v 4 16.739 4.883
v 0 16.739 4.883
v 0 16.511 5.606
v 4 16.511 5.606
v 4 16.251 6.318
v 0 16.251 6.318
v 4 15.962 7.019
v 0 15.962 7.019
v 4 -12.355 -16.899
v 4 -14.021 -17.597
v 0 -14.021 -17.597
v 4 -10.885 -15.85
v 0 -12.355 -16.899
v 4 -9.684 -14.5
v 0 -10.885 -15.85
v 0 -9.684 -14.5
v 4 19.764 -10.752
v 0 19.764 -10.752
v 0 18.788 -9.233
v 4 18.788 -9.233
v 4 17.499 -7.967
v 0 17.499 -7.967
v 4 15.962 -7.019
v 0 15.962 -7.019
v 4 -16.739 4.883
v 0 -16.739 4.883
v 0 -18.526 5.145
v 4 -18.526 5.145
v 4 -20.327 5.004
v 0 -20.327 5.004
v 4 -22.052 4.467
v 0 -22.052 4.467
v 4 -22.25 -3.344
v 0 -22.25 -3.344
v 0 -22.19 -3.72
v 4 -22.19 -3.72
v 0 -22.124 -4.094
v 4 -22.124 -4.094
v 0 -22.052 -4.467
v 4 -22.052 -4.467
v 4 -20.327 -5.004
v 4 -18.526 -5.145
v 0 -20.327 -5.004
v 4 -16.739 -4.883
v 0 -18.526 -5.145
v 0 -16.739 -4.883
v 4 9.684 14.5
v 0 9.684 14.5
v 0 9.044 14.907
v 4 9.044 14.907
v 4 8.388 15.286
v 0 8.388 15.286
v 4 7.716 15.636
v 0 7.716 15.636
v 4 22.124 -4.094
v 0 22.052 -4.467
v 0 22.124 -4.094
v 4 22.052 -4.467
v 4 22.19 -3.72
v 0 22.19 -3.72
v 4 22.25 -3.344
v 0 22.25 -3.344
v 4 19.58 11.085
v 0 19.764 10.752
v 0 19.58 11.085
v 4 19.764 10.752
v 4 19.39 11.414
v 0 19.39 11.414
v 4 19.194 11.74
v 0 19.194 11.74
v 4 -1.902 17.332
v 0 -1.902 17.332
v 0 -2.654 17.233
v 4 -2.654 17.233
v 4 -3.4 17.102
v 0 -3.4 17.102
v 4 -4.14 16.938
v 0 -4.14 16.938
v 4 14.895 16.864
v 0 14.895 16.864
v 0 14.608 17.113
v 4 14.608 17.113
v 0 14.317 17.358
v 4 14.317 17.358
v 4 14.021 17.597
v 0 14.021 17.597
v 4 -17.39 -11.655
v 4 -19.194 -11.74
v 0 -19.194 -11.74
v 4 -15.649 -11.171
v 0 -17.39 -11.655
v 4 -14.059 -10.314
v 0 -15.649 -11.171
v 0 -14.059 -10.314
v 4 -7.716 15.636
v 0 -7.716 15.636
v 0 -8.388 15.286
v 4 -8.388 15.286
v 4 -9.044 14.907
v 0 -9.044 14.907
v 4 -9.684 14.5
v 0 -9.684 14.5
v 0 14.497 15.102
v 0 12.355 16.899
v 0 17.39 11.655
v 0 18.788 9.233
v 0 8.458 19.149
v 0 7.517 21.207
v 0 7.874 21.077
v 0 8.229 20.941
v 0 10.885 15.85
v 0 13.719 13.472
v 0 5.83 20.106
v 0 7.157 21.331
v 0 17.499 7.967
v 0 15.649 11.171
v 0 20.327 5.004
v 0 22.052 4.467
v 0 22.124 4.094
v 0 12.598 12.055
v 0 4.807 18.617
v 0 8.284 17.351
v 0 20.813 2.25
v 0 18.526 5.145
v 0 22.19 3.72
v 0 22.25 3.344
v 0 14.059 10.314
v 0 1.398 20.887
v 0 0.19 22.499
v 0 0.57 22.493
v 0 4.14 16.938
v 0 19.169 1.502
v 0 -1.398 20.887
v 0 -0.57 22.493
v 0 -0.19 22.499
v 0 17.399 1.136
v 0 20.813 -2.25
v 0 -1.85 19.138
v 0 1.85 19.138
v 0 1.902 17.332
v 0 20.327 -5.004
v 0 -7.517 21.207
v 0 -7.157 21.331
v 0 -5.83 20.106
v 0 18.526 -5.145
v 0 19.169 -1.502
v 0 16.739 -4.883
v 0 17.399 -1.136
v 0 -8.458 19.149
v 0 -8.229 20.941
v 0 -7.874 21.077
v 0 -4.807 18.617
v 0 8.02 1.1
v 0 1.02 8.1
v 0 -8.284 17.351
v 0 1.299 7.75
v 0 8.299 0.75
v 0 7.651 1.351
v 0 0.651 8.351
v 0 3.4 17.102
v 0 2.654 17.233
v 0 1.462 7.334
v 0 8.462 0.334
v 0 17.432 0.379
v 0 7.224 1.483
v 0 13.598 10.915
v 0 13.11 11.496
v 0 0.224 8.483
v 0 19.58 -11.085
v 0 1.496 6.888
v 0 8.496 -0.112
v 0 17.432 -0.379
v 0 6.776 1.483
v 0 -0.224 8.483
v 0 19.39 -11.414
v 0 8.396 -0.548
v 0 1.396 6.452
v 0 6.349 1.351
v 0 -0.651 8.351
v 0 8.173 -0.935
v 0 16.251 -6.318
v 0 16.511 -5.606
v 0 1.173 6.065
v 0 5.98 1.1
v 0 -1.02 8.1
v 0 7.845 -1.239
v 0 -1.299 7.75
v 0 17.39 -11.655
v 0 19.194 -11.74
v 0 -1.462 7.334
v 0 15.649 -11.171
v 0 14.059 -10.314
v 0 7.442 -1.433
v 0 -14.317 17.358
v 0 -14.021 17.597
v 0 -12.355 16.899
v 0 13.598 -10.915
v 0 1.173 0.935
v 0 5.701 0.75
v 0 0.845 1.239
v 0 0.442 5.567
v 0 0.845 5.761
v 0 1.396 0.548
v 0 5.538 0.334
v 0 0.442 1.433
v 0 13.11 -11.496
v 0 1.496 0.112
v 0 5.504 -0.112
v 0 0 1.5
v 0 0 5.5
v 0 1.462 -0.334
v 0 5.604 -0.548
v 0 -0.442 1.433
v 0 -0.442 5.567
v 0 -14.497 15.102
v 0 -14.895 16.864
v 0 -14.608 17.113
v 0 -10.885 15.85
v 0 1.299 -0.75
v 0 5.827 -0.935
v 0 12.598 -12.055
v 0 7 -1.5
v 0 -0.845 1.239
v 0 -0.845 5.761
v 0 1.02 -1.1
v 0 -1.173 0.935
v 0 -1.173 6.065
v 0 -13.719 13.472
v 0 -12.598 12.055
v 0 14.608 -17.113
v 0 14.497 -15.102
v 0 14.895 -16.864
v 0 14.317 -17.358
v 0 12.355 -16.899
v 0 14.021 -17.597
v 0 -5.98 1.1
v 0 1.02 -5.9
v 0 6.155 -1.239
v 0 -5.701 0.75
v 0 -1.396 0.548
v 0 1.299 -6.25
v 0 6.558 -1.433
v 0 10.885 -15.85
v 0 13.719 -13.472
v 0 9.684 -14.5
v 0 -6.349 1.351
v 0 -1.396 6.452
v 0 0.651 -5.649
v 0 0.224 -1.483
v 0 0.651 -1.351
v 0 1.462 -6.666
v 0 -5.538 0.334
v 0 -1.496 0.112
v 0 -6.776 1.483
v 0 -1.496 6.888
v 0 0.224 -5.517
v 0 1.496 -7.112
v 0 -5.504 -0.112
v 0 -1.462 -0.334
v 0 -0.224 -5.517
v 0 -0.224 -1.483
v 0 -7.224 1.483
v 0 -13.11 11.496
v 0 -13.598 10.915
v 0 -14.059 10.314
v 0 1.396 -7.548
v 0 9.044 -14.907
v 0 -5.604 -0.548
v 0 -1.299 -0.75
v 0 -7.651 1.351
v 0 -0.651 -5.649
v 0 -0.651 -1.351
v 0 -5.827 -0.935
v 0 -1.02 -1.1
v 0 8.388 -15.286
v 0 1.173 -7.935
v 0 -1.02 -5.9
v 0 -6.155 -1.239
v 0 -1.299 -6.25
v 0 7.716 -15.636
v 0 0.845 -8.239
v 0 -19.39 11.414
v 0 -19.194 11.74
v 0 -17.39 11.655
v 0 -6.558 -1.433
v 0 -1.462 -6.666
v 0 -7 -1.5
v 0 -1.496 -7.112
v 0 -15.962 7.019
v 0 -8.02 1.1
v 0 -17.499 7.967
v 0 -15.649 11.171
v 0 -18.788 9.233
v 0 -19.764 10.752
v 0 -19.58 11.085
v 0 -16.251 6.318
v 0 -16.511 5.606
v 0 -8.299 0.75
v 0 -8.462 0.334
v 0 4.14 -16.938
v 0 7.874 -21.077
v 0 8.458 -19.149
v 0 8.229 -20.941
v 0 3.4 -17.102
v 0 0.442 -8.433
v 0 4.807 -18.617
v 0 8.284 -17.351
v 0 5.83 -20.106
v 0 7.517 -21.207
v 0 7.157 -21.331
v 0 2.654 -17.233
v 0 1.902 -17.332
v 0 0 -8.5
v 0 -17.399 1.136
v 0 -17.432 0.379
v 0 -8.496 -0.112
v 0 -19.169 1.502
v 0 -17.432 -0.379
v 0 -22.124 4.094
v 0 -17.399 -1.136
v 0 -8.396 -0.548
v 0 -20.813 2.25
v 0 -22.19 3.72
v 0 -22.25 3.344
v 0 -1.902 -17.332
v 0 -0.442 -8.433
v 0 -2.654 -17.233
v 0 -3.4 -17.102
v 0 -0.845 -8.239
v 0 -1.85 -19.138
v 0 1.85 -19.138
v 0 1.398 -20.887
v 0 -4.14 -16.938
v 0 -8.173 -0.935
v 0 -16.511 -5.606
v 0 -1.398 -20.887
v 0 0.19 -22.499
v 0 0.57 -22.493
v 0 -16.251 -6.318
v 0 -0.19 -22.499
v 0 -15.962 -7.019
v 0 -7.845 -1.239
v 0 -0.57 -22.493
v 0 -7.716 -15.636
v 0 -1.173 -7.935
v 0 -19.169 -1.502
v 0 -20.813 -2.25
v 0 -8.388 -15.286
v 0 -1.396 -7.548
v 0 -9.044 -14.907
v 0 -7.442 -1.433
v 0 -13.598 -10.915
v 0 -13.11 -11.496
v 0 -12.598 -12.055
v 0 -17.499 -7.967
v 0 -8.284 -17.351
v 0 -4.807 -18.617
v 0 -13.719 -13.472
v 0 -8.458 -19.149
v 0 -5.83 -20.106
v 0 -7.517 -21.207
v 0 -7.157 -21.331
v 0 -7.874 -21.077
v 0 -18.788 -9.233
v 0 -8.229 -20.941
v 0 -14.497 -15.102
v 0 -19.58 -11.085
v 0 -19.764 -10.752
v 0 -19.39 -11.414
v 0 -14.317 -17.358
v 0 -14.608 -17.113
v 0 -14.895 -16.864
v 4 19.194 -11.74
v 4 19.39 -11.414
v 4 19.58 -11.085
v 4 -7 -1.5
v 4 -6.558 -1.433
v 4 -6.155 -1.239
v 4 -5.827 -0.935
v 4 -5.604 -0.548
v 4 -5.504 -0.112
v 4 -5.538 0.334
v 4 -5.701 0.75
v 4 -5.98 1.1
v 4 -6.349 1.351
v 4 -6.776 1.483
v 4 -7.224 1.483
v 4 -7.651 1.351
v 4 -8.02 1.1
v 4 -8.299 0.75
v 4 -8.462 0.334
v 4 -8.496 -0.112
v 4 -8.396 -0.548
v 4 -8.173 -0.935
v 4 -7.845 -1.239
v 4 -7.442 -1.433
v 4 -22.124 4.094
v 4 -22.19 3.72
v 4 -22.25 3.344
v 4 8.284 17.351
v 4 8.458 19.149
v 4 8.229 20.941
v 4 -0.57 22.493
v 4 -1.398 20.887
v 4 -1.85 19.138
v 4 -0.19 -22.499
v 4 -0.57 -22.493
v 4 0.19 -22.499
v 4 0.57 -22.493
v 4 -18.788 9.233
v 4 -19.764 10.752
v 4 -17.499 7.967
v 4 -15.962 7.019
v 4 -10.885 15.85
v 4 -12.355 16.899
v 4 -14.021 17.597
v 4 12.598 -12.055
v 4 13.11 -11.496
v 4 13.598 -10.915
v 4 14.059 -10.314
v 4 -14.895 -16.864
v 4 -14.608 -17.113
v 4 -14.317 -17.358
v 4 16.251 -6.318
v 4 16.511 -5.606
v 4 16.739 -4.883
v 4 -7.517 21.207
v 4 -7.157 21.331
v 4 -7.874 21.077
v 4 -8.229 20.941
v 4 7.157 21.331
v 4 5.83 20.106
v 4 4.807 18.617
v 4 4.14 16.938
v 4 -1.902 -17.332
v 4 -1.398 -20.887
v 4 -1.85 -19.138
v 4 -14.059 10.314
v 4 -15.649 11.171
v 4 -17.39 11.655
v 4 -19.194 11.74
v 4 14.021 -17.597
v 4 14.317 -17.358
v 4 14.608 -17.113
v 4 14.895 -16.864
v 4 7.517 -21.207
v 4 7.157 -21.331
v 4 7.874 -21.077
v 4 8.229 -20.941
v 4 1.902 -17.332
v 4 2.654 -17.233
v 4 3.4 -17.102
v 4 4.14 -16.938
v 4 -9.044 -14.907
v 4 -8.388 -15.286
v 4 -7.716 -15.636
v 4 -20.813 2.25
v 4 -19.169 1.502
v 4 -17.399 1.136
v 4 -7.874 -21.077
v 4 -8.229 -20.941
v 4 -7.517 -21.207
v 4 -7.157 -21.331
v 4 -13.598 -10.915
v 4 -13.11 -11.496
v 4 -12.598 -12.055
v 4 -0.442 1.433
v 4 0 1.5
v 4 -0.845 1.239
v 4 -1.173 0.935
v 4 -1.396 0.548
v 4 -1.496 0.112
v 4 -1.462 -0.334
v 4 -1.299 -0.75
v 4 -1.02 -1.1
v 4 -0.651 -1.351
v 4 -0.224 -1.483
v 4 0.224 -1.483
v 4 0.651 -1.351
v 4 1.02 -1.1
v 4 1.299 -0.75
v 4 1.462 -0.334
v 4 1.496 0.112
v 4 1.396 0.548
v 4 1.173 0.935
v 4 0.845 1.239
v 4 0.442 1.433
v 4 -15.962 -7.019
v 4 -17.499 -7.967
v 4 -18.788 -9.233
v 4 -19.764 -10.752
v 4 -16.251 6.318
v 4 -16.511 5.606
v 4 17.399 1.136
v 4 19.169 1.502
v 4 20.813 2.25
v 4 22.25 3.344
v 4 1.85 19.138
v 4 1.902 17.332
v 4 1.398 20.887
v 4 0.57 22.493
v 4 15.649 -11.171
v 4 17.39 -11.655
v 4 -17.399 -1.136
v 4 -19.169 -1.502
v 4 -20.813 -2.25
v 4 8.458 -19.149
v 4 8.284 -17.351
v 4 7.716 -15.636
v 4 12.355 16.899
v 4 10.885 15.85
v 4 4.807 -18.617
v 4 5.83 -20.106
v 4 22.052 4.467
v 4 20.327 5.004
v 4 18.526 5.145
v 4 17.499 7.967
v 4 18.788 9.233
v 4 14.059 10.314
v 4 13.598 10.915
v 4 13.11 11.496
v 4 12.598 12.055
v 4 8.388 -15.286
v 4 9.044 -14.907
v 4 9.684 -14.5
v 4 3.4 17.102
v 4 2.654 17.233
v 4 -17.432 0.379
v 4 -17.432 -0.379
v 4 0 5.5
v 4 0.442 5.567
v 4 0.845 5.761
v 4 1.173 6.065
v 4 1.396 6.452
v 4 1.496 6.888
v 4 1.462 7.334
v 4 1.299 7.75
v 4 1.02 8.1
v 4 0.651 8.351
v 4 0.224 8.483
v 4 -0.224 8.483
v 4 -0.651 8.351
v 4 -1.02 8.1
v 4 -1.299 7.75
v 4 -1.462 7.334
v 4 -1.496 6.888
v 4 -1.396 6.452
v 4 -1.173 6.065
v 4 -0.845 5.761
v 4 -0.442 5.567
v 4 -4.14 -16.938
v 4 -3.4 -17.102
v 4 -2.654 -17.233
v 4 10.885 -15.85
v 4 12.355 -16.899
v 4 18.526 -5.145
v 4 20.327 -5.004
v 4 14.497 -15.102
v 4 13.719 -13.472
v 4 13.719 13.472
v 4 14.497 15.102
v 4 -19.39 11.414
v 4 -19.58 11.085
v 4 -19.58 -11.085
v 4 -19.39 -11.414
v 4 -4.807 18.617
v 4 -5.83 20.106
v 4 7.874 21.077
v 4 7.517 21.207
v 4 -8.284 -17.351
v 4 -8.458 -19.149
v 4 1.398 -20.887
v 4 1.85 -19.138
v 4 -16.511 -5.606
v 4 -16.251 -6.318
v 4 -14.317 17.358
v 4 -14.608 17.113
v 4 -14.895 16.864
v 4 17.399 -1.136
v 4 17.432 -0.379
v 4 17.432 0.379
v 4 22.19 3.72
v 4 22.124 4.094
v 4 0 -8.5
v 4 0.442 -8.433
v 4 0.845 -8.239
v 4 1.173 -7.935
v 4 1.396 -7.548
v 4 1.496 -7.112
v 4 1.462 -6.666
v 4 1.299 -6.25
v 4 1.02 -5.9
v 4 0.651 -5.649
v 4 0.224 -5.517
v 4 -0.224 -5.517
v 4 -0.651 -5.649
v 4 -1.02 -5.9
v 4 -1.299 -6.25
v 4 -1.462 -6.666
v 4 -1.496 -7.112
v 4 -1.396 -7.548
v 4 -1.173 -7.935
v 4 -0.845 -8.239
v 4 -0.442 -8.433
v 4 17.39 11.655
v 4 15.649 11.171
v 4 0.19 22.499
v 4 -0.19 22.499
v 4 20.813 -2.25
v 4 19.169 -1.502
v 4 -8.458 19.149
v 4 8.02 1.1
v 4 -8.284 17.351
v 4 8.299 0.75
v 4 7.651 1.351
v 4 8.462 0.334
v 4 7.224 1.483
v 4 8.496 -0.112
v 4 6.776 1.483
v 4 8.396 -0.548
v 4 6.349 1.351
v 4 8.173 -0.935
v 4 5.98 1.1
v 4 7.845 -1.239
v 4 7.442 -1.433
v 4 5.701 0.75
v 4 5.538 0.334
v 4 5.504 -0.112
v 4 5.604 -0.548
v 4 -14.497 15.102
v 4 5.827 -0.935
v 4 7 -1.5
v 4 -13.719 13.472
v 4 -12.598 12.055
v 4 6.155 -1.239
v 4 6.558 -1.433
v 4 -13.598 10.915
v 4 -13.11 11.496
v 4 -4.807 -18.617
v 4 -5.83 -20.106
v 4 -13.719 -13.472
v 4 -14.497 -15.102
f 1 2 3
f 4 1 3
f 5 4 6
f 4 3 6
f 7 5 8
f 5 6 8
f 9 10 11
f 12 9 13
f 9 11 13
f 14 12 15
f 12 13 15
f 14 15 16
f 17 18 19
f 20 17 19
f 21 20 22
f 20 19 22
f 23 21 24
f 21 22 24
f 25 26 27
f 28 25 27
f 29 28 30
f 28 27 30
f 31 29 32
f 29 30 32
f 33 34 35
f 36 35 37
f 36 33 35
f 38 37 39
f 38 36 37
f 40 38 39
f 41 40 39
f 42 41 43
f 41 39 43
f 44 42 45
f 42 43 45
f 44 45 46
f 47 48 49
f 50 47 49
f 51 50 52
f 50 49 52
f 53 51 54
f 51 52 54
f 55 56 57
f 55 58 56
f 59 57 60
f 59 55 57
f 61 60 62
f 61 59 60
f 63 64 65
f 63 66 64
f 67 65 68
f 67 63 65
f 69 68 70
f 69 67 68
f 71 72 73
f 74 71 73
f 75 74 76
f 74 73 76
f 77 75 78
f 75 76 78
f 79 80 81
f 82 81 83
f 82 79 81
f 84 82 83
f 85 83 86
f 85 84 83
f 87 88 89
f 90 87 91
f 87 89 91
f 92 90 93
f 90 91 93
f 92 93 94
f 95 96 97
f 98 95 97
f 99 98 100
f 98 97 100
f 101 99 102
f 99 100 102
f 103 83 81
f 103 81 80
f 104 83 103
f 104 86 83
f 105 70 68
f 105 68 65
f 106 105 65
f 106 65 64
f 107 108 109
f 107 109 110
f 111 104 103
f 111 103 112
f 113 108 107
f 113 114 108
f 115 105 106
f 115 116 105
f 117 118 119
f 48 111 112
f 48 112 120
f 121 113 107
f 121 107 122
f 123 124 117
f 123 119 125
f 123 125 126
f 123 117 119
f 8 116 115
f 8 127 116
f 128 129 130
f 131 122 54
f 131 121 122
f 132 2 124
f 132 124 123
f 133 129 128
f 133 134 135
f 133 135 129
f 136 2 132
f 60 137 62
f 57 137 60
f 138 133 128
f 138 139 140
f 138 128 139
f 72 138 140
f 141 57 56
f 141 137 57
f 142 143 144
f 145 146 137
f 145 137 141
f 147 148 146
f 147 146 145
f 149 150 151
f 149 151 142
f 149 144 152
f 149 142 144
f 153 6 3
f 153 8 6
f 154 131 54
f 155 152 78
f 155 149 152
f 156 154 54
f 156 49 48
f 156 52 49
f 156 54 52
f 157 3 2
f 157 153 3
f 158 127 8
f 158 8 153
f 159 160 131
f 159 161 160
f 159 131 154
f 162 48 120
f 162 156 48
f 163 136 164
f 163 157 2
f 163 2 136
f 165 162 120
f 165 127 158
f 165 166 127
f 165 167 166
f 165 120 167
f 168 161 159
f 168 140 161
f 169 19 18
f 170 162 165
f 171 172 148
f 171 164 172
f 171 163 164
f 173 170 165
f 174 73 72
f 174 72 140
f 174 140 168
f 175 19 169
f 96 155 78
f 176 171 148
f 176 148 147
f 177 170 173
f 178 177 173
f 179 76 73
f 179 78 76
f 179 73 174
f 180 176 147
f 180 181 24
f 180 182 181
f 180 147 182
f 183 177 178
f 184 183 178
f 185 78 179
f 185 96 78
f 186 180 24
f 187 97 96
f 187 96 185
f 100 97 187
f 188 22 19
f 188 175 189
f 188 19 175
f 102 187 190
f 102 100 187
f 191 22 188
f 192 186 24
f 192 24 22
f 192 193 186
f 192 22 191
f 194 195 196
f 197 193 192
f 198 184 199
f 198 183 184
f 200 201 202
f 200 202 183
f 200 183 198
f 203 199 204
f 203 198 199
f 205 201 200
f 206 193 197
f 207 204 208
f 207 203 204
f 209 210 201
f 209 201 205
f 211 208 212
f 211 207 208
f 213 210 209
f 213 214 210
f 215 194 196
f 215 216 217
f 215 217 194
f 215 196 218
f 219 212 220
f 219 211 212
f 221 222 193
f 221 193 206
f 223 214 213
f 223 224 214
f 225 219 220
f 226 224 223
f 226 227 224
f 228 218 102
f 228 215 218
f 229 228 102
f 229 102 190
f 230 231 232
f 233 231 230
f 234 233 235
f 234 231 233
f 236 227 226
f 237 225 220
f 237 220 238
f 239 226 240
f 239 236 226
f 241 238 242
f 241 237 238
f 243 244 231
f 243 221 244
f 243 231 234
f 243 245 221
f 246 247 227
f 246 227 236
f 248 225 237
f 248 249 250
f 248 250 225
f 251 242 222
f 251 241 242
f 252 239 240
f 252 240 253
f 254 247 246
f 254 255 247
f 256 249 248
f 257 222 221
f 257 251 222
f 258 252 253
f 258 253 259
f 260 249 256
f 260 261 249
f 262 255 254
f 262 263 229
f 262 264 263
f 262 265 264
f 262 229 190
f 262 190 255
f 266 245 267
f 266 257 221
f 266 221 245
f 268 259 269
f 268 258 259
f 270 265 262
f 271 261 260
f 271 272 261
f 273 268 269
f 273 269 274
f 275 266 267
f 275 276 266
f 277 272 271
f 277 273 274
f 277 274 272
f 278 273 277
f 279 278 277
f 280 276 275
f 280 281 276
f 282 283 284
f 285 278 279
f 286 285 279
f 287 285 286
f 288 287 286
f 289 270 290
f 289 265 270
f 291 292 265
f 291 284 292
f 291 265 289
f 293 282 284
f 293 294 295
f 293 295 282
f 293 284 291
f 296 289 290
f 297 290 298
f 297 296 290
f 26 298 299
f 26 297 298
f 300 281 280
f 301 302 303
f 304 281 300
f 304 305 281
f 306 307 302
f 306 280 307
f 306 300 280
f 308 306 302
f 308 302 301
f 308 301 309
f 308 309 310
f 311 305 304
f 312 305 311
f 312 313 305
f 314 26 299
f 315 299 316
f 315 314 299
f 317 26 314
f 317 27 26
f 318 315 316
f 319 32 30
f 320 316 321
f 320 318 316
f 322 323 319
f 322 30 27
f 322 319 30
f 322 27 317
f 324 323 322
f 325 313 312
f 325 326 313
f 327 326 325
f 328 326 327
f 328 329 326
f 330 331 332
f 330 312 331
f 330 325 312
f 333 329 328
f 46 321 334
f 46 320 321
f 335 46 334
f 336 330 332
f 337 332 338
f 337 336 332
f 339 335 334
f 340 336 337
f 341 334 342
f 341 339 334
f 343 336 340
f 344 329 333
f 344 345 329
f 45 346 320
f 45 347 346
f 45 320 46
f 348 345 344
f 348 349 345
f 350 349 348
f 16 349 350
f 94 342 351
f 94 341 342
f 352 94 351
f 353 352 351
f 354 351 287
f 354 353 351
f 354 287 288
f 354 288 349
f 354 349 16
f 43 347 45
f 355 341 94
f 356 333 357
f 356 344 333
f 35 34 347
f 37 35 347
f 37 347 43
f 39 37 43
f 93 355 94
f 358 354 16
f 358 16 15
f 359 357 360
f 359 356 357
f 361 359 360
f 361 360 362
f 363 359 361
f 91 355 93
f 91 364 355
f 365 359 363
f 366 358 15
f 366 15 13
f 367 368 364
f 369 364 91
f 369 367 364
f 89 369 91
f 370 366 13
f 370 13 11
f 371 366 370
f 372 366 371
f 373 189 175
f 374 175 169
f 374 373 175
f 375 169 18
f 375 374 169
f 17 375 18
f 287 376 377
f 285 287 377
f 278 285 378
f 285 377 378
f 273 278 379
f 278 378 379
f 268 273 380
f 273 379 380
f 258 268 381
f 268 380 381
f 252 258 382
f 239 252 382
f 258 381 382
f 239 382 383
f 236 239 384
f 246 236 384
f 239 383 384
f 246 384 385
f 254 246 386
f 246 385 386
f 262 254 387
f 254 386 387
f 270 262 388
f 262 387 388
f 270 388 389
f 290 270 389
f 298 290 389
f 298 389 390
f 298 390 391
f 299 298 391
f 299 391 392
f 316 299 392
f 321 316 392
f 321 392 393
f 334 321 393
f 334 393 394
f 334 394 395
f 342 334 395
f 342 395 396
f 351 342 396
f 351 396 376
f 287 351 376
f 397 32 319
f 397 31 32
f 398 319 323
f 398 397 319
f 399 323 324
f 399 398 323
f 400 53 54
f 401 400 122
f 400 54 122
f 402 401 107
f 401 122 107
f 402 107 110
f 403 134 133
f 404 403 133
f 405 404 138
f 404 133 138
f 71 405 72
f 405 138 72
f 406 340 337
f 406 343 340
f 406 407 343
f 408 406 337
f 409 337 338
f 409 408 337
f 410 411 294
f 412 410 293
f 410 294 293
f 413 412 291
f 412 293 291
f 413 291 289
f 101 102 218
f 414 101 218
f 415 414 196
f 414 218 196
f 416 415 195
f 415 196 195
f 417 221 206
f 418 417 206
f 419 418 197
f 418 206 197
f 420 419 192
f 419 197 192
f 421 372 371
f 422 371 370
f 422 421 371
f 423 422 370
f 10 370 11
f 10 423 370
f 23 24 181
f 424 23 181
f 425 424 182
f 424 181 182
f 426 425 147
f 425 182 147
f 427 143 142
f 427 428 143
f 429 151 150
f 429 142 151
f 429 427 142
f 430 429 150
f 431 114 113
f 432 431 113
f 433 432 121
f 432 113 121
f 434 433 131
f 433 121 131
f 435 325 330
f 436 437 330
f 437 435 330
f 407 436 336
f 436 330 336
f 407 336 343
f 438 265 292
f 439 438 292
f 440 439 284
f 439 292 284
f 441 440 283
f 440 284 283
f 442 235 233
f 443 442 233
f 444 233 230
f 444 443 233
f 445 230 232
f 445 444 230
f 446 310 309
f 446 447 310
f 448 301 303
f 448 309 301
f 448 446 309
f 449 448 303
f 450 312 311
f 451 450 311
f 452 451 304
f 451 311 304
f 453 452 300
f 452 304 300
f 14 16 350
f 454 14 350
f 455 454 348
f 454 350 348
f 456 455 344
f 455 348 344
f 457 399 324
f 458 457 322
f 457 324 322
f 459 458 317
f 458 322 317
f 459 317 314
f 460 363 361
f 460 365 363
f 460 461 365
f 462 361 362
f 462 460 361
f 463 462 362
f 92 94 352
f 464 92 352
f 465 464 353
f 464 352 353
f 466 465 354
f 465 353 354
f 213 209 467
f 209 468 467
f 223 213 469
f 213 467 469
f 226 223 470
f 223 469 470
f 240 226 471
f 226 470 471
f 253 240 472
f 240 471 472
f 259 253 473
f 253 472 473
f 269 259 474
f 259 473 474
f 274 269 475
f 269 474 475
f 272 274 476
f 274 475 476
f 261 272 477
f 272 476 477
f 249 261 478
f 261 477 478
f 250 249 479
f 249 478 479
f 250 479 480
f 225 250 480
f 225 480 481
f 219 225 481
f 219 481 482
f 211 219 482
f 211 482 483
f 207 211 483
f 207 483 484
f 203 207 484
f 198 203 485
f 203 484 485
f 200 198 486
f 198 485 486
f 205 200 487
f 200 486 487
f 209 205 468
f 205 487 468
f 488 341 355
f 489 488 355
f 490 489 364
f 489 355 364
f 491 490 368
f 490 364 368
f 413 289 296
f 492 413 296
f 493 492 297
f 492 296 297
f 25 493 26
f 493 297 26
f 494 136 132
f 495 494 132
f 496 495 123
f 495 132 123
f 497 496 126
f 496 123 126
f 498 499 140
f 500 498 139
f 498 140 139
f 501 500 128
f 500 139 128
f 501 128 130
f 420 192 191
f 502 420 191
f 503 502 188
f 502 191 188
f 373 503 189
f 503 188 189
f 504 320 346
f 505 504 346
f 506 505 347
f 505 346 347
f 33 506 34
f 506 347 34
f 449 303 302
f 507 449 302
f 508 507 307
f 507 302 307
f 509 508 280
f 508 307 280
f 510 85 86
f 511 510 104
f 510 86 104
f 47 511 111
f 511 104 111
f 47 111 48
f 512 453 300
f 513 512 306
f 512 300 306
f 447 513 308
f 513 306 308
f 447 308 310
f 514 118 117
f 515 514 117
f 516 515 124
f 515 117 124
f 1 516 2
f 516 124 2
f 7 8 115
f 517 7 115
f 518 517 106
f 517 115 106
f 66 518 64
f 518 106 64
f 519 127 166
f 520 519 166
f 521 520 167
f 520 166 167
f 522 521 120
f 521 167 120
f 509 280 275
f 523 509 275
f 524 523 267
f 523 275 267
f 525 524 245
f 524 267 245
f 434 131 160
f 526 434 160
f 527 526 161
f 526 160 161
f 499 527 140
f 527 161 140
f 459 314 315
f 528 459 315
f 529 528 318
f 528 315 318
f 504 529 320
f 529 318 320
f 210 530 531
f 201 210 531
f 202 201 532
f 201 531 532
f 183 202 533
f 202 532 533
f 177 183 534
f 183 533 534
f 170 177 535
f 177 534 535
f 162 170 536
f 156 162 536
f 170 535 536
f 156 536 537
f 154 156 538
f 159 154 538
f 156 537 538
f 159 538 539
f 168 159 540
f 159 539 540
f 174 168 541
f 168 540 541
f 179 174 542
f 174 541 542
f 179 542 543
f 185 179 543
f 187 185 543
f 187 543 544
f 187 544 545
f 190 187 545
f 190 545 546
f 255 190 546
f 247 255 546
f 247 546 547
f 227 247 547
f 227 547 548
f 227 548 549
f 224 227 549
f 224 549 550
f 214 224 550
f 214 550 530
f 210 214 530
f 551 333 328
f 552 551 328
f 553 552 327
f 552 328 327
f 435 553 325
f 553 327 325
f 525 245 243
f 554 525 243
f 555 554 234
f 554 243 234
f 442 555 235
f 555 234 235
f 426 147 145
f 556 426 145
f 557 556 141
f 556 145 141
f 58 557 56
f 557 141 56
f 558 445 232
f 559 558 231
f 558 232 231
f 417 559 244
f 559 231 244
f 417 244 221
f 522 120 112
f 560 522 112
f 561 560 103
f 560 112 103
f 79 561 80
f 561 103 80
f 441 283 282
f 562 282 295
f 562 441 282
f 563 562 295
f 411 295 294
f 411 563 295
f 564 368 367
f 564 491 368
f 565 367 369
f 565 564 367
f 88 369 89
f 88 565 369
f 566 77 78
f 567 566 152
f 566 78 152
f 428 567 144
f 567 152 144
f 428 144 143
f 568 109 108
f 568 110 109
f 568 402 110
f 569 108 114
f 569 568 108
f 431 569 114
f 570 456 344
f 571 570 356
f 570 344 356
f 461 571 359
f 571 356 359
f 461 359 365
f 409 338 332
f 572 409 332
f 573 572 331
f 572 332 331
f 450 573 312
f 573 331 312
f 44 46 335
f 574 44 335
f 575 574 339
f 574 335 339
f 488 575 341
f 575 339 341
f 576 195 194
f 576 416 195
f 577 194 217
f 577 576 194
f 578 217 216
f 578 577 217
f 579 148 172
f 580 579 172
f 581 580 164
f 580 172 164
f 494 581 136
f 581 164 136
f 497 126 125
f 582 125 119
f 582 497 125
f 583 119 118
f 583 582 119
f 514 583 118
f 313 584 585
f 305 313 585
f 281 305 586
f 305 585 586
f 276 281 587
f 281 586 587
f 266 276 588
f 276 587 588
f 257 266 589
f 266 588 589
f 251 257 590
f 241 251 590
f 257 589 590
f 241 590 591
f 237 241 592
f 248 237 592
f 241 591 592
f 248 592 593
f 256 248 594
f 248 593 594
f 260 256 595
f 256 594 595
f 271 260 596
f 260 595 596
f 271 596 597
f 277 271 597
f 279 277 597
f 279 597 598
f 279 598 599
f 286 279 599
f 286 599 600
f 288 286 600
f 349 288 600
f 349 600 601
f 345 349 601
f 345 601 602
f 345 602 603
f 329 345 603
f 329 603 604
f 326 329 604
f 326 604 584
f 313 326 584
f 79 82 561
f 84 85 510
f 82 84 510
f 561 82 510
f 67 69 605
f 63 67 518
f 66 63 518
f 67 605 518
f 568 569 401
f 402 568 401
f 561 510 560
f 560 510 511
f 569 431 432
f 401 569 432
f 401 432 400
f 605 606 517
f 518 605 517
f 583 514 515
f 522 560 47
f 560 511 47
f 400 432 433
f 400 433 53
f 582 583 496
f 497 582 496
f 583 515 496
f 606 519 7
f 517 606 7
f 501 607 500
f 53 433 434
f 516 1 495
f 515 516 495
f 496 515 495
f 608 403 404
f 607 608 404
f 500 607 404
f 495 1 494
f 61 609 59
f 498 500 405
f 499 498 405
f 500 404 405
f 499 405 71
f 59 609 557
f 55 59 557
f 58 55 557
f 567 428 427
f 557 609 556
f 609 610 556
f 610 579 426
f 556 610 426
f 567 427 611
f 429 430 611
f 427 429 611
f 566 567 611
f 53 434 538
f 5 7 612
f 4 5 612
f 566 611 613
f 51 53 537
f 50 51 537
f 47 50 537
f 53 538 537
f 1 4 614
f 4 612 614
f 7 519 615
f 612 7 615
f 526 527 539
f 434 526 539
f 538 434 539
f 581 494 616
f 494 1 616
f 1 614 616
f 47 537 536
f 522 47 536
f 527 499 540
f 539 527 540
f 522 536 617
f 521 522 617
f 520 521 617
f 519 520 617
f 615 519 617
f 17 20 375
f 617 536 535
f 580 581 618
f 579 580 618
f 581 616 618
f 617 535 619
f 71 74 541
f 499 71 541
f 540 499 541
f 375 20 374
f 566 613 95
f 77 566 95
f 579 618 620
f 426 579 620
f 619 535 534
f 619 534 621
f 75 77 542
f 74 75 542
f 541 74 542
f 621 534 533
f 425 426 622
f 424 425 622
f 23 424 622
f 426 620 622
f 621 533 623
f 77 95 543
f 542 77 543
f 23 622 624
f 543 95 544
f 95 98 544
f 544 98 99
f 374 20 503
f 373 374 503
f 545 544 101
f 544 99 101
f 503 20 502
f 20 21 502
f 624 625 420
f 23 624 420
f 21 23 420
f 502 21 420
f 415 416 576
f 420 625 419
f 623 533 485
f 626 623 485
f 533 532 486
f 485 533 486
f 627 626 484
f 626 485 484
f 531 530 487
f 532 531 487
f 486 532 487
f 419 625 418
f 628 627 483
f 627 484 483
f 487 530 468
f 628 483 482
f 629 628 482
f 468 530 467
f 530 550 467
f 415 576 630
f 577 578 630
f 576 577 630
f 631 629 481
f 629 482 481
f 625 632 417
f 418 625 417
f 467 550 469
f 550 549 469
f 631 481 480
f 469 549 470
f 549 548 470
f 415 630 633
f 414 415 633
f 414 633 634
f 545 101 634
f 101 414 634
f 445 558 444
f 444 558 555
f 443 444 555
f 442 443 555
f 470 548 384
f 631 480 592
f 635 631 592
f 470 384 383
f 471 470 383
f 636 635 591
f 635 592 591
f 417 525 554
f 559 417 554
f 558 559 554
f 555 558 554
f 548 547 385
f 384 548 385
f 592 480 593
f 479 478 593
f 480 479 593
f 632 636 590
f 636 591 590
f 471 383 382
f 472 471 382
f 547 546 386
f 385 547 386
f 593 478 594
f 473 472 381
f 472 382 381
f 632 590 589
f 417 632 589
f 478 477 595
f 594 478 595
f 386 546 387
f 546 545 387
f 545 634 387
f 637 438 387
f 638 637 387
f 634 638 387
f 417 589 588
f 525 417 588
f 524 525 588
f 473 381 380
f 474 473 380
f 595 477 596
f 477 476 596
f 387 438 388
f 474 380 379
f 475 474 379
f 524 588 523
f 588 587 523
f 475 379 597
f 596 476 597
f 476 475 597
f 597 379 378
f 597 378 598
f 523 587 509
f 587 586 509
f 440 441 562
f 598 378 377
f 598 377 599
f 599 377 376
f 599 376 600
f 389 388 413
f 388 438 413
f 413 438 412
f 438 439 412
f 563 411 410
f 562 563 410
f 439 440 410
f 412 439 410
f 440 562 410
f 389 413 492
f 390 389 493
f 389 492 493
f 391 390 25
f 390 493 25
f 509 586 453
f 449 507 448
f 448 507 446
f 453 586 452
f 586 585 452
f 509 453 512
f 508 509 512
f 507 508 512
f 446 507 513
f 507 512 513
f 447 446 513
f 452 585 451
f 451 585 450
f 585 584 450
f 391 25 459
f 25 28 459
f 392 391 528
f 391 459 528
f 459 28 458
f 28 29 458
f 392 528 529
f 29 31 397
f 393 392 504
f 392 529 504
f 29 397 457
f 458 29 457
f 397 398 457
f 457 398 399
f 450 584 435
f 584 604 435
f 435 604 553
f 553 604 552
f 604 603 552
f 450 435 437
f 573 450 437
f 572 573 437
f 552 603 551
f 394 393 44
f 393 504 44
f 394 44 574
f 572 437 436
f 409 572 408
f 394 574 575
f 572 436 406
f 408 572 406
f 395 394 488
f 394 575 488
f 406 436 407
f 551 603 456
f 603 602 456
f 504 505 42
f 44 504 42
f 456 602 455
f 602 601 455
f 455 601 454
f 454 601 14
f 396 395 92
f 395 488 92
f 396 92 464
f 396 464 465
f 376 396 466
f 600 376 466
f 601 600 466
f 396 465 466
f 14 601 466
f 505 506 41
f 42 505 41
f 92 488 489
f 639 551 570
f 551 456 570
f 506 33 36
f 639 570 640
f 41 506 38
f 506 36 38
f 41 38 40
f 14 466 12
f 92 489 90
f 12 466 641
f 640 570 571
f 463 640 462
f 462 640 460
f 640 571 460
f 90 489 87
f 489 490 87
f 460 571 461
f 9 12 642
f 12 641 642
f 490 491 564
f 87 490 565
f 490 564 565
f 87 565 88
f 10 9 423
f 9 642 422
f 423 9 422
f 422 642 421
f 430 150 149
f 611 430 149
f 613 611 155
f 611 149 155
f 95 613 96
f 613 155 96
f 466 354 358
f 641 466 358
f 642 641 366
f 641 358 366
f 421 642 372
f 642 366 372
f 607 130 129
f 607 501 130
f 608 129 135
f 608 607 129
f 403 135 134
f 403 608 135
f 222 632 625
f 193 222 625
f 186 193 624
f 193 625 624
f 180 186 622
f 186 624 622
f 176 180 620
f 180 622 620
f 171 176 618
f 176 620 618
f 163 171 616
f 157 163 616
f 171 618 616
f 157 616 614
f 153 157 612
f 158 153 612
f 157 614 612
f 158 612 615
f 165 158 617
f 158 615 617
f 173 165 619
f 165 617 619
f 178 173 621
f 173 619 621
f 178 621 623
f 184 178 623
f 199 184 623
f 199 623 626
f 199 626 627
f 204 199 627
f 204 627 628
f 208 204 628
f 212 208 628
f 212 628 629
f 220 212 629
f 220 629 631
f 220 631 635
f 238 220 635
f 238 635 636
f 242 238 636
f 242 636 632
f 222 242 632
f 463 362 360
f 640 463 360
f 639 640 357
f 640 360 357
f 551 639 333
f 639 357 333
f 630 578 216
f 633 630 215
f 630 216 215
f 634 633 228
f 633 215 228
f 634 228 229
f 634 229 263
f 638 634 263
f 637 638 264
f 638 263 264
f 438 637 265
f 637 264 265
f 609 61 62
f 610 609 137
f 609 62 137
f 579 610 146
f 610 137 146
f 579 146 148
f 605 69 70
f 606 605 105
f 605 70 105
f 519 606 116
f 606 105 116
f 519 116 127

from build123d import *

# Parameters (mm, degrees)
BASPROSKE_W         = 4
BASPROSKE_H         = 22.5
TOOTHCUT_DEPTH      = 33.070235422
TEETHCUTS_COUNT     = 18
TEETHCUTS_ANGLE     = 340
BORSKE_R            = 1.5
BORE_DEPTH          = 50.0000508
SKETCH_1_R          = 1.5
CUT_EXTRUDE_1_DEPTH = 32.895398001


with BuildPart() as part:
    # BasProSke → Base-Revolve (revolve)
    with BuildSketch(Plane(origin=(0, 0, 0), x_dir=(1, 0, 0), z_dir=(0, 1, 0)), mode=Mode.PRIVATE) as base_revolve_sk:
        with Locations((2, 11.25)):
            Rectangle(BASPROSKE_W, BASPROSKE_H)
    revolve(base_revolve_sk.sketch.rotate(Axis((-10, 0, 0), (1, 0, 0)), 180), axis=Axis((-10, 0, 0), (1, 0, 0)))

    # TooCutSke → ToothCut (cut, through all)
    with BuildSketch(Plane(origin=(0, 0, 0), x_dir=(0, 0, -1), z_dir=(1, 0, 0))):
        with BuildLine():
            ThreePointArc((1.136237076, 17.399439576), (0, 17.4365), (-1.136237076, 17.399439576))
            ThreePointArc((-1.136237076, 17.399439576), (-1.836299497, 20.025700007), (-3.36570362, 22.272532059))
            ThreePointArc((-3.36570362, 22.272532059), (0, 22.5254), (3.36570362, 22.272532059))
            ThreePointArc((3.36570362, 22.272532059), (1.836299497, 20.025700007), (1.136237076, 17.399439576))
        make_face()
    toothcut = extrude(amount=TOOTHCUT_DEPTH, mode=Mode.SUBTRACT)

    # TeethCuts: ToothCut ×18 about axis
    teethcuts_axis = Axis((-10, 0, 0), (1, 0, 0))
    for i in range(1, TEETHCUTS_COUNT):
        add(toothcut.rotate(teethcuts_axis, i * TEETHCUTS_ANGLE / (TEETHCUTS_COUNT - 1)), mode=Mode.SUBTRACT)

    # BorSke → Bore (cut, symmetric)
    with BuildSketch(Plane(origin=(0, 0, 0), x_dir=(0, 0, -1), z_dir=(1, 0, 0))):
        with Locations(Location((0, 0, 0), (0, 0, 180))):
            Circle(BORSKE_R)
    extrude(amount=BORE_DEPTH, both=True, mode=Mode.SUBTRACT)

    # 草图1 → 切除-拉伸1 (cut, through all)
    with BuildSketch(Plane(origin=(4, 0, 0), x_dir=(0, 0, -1), z_dir=(1, 0, 0))):
        with Locations((0, 7)):
            Circle(SKETCH_1_R)
        with Locations((7, 0)):
            Circle(SKETCH_1_R)
        with Locations((-7, 0)):
            Circle(SKETCH_1_R)
        with Locations((0, -7)):
            Circle(SKETCH_1_R)
    extrude(amount=-CUT_EXTRUDE_1_DEPTH, mode=Mode.SUBTRACT)


solid = part.part
